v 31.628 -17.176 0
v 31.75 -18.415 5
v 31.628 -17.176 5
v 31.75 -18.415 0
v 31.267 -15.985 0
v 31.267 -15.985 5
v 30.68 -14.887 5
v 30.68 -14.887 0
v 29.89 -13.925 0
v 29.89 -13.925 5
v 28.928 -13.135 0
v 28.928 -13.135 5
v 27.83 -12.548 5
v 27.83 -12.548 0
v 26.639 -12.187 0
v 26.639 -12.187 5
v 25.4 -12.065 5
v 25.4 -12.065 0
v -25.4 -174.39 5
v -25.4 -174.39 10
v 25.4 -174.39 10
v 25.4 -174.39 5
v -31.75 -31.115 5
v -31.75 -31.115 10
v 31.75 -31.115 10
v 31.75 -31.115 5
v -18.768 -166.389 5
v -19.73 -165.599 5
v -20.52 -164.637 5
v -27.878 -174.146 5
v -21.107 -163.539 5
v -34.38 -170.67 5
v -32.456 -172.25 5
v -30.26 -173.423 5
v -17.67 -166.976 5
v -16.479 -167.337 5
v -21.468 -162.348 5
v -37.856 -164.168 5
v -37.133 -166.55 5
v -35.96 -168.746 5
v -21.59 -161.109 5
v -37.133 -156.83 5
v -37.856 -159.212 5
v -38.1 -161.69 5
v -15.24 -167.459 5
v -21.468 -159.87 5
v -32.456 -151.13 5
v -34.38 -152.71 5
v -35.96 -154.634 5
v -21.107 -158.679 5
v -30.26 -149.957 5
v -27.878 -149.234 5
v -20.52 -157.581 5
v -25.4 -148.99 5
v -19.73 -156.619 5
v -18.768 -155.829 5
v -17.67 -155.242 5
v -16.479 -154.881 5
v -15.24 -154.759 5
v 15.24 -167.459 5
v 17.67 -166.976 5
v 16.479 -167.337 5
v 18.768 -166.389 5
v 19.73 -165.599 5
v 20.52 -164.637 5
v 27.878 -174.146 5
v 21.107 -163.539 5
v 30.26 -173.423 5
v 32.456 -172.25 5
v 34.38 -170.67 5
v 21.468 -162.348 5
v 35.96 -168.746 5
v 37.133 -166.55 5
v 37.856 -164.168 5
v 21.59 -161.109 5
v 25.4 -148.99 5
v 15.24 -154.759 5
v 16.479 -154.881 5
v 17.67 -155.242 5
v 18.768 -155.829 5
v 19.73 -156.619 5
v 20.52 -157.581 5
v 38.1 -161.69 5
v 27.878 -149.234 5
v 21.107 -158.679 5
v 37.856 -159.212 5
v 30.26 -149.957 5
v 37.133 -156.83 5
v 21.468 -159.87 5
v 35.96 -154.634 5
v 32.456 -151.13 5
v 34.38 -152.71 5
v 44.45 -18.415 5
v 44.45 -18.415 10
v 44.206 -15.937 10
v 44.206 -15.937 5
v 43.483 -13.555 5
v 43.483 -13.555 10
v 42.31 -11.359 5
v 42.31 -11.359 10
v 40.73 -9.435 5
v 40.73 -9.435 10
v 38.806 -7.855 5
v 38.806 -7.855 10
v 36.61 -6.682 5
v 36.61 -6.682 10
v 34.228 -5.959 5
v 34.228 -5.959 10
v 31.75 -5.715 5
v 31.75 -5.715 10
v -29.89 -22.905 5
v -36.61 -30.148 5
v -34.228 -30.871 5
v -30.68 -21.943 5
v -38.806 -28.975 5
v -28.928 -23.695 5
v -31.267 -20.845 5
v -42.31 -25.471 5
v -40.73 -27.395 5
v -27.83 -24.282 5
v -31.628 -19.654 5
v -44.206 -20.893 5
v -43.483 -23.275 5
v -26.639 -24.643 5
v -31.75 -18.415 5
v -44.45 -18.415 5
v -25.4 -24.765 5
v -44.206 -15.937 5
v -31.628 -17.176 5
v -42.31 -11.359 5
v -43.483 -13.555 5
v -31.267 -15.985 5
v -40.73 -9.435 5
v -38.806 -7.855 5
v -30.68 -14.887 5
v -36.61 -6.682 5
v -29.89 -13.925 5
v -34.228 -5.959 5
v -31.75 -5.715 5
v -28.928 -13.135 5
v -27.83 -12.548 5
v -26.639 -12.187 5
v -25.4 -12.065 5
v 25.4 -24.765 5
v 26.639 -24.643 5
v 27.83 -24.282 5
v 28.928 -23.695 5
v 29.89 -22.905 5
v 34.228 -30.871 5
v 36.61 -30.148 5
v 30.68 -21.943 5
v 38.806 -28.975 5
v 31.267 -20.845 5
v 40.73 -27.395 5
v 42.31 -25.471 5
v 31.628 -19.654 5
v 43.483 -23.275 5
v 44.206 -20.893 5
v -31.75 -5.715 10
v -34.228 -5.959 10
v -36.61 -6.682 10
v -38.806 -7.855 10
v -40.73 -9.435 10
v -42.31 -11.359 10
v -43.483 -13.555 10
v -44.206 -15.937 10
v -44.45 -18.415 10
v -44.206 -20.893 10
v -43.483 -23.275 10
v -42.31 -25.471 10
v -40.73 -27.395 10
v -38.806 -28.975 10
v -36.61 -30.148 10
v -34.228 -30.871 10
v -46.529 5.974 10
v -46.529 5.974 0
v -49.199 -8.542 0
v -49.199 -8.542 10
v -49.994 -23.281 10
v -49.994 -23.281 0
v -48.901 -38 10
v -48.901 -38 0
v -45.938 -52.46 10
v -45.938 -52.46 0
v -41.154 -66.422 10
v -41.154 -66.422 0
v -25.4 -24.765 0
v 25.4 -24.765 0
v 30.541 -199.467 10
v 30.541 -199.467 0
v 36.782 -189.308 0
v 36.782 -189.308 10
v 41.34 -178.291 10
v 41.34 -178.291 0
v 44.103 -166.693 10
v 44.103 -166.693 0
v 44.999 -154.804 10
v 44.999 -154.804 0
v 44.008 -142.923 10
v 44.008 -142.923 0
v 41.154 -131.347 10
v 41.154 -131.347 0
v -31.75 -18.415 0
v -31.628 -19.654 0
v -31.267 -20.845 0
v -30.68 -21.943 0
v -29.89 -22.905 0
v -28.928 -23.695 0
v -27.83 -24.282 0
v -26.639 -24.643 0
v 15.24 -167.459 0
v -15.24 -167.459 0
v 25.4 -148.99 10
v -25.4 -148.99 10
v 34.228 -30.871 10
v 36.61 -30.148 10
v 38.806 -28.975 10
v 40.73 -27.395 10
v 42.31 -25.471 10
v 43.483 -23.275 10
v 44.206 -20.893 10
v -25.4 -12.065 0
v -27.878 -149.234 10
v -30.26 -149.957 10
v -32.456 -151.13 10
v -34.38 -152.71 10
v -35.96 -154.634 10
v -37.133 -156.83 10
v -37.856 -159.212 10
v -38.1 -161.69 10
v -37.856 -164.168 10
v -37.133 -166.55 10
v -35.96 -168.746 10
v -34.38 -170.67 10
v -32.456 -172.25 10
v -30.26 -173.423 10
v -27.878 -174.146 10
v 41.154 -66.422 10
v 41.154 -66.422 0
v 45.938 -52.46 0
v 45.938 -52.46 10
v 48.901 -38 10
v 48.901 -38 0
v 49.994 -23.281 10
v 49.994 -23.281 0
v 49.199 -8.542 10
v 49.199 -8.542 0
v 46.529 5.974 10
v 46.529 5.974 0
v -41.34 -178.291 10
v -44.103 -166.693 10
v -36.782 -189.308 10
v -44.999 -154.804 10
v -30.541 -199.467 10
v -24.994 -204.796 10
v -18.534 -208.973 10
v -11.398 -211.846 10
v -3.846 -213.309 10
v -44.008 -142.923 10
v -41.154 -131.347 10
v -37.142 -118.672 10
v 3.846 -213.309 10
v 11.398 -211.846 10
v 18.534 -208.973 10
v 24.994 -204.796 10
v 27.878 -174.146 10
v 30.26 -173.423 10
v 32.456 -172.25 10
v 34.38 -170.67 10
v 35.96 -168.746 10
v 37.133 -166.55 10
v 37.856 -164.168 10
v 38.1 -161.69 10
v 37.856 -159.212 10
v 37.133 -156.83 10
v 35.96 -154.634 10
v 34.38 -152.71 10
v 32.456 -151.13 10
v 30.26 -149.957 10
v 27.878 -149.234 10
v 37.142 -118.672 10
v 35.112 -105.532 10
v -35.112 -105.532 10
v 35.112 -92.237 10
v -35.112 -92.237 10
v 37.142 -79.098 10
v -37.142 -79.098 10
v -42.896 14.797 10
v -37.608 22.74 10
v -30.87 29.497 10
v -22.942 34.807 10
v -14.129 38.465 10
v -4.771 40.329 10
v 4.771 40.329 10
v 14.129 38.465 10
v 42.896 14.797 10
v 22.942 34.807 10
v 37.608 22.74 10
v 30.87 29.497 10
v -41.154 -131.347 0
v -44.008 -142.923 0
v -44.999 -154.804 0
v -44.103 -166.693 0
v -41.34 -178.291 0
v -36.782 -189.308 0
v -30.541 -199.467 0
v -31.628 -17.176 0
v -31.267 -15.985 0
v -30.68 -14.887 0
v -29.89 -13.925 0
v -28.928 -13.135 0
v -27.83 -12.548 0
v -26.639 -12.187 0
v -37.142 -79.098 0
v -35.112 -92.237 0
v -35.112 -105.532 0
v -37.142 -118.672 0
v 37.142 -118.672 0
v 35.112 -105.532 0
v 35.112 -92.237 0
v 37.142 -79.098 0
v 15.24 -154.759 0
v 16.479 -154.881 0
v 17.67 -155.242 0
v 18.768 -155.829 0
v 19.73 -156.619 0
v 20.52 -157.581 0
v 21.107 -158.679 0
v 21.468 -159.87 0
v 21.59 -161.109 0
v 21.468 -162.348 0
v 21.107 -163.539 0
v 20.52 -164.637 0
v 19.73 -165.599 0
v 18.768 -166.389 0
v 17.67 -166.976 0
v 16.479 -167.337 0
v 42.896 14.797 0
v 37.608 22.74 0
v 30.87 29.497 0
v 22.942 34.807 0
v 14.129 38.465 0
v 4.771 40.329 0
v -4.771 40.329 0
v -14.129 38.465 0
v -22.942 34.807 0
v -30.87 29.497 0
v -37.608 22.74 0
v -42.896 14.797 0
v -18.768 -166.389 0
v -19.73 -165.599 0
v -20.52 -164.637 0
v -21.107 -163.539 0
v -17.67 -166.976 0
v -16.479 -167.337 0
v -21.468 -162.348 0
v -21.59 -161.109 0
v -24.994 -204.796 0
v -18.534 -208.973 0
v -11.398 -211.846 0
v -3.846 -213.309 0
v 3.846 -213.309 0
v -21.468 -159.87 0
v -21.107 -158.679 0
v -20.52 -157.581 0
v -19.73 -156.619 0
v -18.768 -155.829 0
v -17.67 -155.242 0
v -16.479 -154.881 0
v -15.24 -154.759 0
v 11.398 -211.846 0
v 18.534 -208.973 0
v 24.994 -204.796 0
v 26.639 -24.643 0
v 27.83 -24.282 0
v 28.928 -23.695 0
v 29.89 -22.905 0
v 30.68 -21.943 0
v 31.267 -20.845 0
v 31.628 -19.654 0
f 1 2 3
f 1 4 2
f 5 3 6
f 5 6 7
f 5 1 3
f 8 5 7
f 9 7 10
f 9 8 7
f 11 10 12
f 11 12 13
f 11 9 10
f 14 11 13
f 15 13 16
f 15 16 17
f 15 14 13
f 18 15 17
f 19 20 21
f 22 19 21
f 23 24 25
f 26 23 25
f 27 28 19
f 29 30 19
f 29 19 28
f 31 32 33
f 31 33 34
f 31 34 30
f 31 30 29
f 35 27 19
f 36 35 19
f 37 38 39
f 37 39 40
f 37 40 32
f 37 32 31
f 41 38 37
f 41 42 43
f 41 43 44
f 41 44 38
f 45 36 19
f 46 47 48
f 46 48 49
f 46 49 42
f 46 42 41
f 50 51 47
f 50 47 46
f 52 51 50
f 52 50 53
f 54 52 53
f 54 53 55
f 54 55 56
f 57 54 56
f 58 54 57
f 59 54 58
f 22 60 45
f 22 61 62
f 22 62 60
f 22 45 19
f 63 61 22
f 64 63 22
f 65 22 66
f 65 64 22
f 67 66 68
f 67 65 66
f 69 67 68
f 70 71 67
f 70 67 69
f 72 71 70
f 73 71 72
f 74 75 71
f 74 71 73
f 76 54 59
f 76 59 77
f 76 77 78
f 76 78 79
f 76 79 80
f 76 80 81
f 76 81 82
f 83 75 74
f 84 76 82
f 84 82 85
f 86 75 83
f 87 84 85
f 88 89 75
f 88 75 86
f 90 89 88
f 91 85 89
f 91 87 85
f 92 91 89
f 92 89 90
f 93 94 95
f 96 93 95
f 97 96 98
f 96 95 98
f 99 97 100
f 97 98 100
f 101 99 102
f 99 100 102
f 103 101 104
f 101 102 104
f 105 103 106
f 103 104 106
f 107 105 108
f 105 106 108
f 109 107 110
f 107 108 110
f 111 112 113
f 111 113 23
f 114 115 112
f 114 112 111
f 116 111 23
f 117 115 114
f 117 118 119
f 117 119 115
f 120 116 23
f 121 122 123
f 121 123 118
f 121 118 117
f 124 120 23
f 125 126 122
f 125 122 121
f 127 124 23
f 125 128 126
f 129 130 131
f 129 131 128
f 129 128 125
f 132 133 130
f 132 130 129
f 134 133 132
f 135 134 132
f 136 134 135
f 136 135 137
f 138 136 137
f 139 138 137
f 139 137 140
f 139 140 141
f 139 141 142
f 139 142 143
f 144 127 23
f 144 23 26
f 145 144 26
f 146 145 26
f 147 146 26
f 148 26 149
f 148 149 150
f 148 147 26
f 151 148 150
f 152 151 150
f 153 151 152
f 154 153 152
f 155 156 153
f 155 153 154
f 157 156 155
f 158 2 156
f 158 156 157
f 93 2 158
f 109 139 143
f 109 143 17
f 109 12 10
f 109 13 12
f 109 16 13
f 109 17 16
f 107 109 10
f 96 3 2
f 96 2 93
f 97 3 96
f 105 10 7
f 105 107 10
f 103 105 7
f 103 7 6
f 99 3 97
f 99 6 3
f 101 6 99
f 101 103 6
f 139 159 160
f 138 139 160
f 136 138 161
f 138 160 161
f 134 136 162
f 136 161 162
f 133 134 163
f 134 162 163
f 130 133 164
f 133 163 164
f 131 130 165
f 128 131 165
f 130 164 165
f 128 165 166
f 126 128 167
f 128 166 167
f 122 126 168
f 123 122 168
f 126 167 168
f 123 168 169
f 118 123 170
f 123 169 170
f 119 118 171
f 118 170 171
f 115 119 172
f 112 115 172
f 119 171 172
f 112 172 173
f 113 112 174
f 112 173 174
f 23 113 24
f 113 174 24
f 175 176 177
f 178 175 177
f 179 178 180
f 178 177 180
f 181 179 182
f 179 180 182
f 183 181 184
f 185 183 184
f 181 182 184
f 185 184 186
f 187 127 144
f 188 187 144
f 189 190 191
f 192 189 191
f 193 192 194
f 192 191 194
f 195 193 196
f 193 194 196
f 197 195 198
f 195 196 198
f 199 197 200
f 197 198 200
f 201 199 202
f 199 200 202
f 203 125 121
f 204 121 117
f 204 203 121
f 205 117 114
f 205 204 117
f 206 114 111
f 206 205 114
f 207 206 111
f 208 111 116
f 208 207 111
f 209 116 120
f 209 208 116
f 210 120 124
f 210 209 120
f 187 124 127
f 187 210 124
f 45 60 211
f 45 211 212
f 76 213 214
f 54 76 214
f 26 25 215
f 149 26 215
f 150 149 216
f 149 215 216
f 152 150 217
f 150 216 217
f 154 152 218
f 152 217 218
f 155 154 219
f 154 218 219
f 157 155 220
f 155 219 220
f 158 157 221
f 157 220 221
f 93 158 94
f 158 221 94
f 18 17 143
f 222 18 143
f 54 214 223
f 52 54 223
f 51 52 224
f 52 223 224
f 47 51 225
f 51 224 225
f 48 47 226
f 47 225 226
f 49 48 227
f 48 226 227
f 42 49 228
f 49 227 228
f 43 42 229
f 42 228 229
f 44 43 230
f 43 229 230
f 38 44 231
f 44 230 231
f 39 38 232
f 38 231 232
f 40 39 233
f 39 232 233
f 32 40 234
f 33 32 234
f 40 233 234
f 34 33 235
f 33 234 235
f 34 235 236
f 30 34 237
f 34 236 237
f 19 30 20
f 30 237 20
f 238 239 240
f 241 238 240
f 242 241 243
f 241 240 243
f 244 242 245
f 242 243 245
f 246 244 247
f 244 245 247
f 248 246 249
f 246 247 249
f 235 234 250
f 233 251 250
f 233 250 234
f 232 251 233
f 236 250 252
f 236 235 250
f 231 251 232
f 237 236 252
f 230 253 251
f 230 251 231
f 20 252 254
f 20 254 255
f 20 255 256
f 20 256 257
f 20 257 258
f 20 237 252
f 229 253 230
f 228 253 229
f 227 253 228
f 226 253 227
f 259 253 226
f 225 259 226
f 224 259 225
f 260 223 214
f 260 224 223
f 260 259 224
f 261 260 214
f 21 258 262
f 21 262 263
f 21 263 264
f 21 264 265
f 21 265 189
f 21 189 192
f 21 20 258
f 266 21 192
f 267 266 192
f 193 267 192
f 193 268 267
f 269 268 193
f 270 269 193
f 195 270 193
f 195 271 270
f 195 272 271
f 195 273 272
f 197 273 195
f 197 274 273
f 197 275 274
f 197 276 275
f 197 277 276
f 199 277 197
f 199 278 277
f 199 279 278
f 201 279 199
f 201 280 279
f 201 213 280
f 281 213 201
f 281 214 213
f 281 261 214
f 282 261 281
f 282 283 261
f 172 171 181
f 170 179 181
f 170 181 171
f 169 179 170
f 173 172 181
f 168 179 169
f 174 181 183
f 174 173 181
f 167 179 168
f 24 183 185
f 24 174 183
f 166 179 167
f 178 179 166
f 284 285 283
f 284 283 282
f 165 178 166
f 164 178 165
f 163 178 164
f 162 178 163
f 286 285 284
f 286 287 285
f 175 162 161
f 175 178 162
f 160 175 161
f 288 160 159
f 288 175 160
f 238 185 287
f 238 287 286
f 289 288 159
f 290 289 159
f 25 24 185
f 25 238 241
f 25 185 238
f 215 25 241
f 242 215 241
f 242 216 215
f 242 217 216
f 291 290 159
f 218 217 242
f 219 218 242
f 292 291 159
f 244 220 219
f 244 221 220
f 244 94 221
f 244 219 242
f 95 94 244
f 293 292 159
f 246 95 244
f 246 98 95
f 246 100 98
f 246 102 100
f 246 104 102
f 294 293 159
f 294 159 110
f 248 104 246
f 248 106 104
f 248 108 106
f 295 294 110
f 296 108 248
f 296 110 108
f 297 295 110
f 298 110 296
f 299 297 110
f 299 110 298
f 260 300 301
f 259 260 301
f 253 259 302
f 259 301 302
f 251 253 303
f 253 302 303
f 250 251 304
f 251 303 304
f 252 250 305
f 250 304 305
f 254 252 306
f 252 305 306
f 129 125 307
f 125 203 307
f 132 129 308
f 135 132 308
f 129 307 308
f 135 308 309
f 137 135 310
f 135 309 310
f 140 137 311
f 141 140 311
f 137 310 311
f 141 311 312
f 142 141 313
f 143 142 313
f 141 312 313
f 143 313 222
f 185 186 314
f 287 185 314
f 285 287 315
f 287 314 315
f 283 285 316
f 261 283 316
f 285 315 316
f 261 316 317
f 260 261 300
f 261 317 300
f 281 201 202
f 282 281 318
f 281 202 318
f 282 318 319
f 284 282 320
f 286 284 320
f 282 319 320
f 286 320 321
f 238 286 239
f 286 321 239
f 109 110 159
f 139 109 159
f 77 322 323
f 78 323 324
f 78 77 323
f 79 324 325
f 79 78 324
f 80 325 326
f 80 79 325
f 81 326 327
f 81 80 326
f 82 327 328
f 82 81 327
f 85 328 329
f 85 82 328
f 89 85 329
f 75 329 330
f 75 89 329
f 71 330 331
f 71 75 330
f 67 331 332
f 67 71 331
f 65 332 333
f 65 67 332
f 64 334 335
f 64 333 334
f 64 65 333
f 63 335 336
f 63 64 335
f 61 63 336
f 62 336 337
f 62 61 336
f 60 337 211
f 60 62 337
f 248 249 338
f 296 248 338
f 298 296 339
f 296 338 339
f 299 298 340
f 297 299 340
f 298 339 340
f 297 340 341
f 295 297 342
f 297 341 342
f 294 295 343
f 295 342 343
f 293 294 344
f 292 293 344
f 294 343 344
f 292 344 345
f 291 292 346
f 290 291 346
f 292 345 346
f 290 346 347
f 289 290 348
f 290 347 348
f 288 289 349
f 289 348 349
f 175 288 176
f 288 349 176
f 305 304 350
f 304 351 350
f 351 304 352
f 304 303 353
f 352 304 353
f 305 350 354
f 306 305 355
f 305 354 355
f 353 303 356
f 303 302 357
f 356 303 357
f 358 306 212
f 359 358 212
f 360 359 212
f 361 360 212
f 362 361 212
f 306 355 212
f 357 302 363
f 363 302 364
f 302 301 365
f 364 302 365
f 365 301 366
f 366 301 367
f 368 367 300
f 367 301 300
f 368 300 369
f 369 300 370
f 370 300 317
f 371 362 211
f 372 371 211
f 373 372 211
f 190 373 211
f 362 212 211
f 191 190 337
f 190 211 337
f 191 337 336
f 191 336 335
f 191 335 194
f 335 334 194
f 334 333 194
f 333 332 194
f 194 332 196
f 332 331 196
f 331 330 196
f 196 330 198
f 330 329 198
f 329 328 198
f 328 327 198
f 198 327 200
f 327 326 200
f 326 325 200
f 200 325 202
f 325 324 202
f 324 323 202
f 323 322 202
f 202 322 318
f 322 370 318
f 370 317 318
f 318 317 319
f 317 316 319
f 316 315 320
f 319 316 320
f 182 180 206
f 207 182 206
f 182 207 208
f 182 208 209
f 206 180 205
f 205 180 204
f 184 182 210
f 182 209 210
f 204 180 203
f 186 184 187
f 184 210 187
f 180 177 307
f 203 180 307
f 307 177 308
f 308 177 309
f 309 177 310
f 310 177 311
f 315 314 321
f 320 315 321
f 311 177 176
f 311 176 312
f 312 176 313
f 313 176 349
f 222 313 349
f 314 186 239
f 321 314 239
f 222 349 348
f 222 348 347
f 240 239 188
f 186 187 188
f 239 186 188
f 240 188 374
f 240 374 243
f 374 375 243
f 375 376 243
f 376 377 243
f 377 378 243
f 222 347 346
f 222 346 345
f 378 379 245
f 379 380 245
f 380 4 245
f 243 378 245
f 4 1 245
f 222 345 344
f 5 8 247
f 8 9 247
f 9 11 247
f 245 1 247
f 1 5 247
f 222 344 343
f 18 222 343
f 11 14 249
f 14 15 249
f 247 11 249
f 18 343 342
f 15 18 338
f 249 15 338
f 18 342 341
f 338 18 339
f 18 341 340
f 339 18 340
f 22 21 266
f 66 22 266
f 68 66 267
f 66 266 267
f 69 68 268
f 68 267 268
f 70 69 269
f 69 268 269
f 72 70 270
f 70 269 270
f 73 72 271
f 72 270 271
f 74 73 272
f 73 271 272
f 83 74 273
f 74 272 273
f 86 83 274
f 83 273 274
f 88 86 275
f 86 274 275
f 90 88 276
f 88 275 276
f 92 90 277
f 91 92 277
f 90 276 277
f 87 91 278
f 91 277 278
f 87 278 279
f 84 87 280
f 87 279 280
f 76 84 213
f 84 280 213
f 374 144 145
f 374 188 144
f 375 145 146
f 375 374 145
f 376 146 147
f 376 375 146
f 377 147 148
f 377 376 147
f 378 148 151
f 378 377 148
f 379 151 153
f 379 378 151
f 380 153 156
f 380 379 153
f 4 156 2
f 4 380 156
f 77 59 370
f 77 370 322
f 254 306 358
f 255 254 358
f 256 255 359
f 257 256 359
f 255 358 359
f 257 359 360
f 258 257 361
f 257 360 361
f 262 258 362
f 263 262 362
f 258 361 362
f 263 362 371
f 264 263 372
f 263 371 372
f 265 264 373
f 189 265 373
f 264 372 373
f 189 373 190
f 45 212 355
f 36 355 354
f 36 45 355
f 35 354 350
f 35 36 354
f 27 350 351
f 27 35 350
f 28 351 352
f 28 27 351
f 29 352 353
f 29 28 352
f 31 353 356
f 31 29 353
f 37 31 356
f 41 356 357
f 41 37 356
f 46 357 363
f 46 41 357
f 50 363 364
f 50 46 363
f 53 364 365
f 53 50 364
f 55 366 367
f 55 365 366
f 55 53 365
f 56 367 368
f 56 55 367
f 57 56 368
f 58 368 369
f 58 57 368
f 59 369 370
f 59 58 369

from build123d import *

# Parameters (mm, degrees)
F1_DEPTH = 10
F3_DEPTH = 5
F5_DEPTH = 25.4
F6_R     = 6.34999
F8_DEPTH = 5
F9_DEPTH = 25.4


# Not quite as in the source:
# - a fillet or chamfer is up to 0.001 mm smaller than in the source, because OpenCascade refuses the exact size


with BuildPart() as f1:
    # F0 (on Top) → F1 (new body)
    with BuildSketch(Plane.XY):
        with BuildLine():
            ThreePointArc((46.5285696909, 5.9739645023), (0, 40.5641849146), (-46.5285696909, 5.9739645023))
            ThreePointArc((-46.5285696909, 5.9739645023), (-49.6833366753, -30.6579453037), (-41.1537964933, -66.4224013325))
            ThreePointArc((-41.1537964933, -66.4224013325), (-34.8569562758, -98.8847496511), (-41.1537964933, -131.3470979697))
            ThreePointArc((-41.1537964933, -131.3470979697), (-44.1025989066, -166.693183735), (-30.5410850268, -199.467053752))
            ThreePointArc((-30.5410850268, -199.467053752), (0, -213.4927201844), (30.5410850268, -199.467053752))
            ThreePointArc((30.5410850268, -199.467053752), (44.1025989066, -166.693183735), (41.1537964933, -131.3470979697))
            ThreePointArc((41.1537964933, -131.3470979697), (34.8569562758, -98.8847496511), (41.1537964933, -66.4224013325))
            ThreePointArc((41.1537964933, -66.4224013325), (49.6833366753, -30.6579453037), (46.5285696909, 5.9739645023))
        make_face()
    extrude(amount=F1_DEPTH)

    # F2 (on face) → F3 (cut)
    with BuildSketch(Plane.XY.offset(10)):
        with BuildLine():
            Line((31.75, -5.715), (0, -5.715))
            Line((0, -5.715), (0, -18.415))
            Line((0, -18.415), (-19.05, -18.415))
            ThreePointArc((-19.05, -18.415), (-22.7697438789, -27.3952561211), (-31.75, -31.115))
            Line((-31.75, -31.115), (31.75, -31.115))
            ThreePointArc((31.75, -31.115), (19.05, -18.415), (31.75, -5.715))
        make_face()
        with BuildLine():
            Line((0, -18.415), (0, -5.715))
            Line((0, -5.715), (-31.75, -5.715))
            ThreePointArc((-31.75, -5.715), (-22.7697438789, -9.4347438789), (-19.05, -18.415))
            Line((-19.05, -18.415), (0, -18.415))
        make_face()
        with BuildLine():
            ThreePointArc((-19.05, -18.415), (-22.7697438789, -9.4347438789), (-31.75, -5.715))
            ThreePointArc((-31.75, -5.715), (-44.45, -18.415), (-31.75, -31.115))
            ThreePointArc((-31.75, -31.115), (-22.7697438789, -27.3952561211), (-19.05, -18.415))
        make_face()
        with BuildLine():
            ThreePointArc((44.45, -18.415), (40.7302561211, -9.4347438789), (31.75, -5.715))
            ThreePointArc((31.75, -5.715), (19.05, -18.415), (31.75, -31.115))
            ThreePointArc((31.75, -31.115), (40.7302561211, -27.3952561211), (44.45, -18.415))
        make_face()
    extrude(amount=-F3_DEPTH, mode=Mode.SUBTRACT)

    # F4 (on face) → F5 (cut)
    with BuildSketch(Plane.XY.offset(5)):
        Polygon((-31.75, -12.065), (-31.75, -18.415), (-31.75, -24.765), (31.75, -24.765), (31.75, -12.065), align=None)
    extrude(amount=-F5_DEPTH, mode=Mode.SUBTRACT)

    # F6 (radius 6.35 in the source; OpenCascade refuses exactly that, so slightly less here)
    f6_edges = [f1.edges().sort_by_distance(p)[0] for p in [
        (-31.75, -12.065, 2.5),
        (-31.75, -24.765, 2.5),
        (31.75, -12.065, 2.5),
        (31.75, -24.765, 2.5),
    ]]
    fillet(f6_edges, radius=F6_R)

    # F7 (on face) → F8 (cut)
    with BuildSketch(Plane.XY.offset(10)):
        with BuildLine():
            Line((25.4, -148.9900371552), (-25.4, -148.9900371552))
            ThreePointArc((-25.4, -148.9900371552), (-38.1, -161.6900371552), (-25.4, -174.3900371552))
            Line((-25.4, -174.3900371552), (25.4, -174.3900371552))
            ThreePointArc((25.4, -174.3900371552), (38.1, -161.6900371552), (25.4, -148.9900371552))
        make_face()
        with BuildLine():
            ThreePointArc((-15.24, -167.4590520005), (-21.59, -161.1090520005), (-15.24, -154.7590520005))
            Line((-15.24, -154.7590520005), (15.24, -154.7590520005))
            ThreePointArc((15.24, -154.7590520005), (21.59, -161.1090520005), (15.24, -167.4590520005))
            Line((15.24, -167.4590520005), (-15.24, -167.4590520005))
        make_face(mode=Mode.SUBTRACT)
    extrude(amount=-F8_DEPTH, mode=Mode.SUBTRACT)

    # F9 (cut): a face of the model
    f9_faces = [f1.faces().sort_by_distance(p)[0] for p in [
        (0, -161.1090520005, 10),
    ]]
    extrude(f9_faces, amount=-F9_DEPTH, mode=Mode.SUBTRACT)


solid = f1.part
